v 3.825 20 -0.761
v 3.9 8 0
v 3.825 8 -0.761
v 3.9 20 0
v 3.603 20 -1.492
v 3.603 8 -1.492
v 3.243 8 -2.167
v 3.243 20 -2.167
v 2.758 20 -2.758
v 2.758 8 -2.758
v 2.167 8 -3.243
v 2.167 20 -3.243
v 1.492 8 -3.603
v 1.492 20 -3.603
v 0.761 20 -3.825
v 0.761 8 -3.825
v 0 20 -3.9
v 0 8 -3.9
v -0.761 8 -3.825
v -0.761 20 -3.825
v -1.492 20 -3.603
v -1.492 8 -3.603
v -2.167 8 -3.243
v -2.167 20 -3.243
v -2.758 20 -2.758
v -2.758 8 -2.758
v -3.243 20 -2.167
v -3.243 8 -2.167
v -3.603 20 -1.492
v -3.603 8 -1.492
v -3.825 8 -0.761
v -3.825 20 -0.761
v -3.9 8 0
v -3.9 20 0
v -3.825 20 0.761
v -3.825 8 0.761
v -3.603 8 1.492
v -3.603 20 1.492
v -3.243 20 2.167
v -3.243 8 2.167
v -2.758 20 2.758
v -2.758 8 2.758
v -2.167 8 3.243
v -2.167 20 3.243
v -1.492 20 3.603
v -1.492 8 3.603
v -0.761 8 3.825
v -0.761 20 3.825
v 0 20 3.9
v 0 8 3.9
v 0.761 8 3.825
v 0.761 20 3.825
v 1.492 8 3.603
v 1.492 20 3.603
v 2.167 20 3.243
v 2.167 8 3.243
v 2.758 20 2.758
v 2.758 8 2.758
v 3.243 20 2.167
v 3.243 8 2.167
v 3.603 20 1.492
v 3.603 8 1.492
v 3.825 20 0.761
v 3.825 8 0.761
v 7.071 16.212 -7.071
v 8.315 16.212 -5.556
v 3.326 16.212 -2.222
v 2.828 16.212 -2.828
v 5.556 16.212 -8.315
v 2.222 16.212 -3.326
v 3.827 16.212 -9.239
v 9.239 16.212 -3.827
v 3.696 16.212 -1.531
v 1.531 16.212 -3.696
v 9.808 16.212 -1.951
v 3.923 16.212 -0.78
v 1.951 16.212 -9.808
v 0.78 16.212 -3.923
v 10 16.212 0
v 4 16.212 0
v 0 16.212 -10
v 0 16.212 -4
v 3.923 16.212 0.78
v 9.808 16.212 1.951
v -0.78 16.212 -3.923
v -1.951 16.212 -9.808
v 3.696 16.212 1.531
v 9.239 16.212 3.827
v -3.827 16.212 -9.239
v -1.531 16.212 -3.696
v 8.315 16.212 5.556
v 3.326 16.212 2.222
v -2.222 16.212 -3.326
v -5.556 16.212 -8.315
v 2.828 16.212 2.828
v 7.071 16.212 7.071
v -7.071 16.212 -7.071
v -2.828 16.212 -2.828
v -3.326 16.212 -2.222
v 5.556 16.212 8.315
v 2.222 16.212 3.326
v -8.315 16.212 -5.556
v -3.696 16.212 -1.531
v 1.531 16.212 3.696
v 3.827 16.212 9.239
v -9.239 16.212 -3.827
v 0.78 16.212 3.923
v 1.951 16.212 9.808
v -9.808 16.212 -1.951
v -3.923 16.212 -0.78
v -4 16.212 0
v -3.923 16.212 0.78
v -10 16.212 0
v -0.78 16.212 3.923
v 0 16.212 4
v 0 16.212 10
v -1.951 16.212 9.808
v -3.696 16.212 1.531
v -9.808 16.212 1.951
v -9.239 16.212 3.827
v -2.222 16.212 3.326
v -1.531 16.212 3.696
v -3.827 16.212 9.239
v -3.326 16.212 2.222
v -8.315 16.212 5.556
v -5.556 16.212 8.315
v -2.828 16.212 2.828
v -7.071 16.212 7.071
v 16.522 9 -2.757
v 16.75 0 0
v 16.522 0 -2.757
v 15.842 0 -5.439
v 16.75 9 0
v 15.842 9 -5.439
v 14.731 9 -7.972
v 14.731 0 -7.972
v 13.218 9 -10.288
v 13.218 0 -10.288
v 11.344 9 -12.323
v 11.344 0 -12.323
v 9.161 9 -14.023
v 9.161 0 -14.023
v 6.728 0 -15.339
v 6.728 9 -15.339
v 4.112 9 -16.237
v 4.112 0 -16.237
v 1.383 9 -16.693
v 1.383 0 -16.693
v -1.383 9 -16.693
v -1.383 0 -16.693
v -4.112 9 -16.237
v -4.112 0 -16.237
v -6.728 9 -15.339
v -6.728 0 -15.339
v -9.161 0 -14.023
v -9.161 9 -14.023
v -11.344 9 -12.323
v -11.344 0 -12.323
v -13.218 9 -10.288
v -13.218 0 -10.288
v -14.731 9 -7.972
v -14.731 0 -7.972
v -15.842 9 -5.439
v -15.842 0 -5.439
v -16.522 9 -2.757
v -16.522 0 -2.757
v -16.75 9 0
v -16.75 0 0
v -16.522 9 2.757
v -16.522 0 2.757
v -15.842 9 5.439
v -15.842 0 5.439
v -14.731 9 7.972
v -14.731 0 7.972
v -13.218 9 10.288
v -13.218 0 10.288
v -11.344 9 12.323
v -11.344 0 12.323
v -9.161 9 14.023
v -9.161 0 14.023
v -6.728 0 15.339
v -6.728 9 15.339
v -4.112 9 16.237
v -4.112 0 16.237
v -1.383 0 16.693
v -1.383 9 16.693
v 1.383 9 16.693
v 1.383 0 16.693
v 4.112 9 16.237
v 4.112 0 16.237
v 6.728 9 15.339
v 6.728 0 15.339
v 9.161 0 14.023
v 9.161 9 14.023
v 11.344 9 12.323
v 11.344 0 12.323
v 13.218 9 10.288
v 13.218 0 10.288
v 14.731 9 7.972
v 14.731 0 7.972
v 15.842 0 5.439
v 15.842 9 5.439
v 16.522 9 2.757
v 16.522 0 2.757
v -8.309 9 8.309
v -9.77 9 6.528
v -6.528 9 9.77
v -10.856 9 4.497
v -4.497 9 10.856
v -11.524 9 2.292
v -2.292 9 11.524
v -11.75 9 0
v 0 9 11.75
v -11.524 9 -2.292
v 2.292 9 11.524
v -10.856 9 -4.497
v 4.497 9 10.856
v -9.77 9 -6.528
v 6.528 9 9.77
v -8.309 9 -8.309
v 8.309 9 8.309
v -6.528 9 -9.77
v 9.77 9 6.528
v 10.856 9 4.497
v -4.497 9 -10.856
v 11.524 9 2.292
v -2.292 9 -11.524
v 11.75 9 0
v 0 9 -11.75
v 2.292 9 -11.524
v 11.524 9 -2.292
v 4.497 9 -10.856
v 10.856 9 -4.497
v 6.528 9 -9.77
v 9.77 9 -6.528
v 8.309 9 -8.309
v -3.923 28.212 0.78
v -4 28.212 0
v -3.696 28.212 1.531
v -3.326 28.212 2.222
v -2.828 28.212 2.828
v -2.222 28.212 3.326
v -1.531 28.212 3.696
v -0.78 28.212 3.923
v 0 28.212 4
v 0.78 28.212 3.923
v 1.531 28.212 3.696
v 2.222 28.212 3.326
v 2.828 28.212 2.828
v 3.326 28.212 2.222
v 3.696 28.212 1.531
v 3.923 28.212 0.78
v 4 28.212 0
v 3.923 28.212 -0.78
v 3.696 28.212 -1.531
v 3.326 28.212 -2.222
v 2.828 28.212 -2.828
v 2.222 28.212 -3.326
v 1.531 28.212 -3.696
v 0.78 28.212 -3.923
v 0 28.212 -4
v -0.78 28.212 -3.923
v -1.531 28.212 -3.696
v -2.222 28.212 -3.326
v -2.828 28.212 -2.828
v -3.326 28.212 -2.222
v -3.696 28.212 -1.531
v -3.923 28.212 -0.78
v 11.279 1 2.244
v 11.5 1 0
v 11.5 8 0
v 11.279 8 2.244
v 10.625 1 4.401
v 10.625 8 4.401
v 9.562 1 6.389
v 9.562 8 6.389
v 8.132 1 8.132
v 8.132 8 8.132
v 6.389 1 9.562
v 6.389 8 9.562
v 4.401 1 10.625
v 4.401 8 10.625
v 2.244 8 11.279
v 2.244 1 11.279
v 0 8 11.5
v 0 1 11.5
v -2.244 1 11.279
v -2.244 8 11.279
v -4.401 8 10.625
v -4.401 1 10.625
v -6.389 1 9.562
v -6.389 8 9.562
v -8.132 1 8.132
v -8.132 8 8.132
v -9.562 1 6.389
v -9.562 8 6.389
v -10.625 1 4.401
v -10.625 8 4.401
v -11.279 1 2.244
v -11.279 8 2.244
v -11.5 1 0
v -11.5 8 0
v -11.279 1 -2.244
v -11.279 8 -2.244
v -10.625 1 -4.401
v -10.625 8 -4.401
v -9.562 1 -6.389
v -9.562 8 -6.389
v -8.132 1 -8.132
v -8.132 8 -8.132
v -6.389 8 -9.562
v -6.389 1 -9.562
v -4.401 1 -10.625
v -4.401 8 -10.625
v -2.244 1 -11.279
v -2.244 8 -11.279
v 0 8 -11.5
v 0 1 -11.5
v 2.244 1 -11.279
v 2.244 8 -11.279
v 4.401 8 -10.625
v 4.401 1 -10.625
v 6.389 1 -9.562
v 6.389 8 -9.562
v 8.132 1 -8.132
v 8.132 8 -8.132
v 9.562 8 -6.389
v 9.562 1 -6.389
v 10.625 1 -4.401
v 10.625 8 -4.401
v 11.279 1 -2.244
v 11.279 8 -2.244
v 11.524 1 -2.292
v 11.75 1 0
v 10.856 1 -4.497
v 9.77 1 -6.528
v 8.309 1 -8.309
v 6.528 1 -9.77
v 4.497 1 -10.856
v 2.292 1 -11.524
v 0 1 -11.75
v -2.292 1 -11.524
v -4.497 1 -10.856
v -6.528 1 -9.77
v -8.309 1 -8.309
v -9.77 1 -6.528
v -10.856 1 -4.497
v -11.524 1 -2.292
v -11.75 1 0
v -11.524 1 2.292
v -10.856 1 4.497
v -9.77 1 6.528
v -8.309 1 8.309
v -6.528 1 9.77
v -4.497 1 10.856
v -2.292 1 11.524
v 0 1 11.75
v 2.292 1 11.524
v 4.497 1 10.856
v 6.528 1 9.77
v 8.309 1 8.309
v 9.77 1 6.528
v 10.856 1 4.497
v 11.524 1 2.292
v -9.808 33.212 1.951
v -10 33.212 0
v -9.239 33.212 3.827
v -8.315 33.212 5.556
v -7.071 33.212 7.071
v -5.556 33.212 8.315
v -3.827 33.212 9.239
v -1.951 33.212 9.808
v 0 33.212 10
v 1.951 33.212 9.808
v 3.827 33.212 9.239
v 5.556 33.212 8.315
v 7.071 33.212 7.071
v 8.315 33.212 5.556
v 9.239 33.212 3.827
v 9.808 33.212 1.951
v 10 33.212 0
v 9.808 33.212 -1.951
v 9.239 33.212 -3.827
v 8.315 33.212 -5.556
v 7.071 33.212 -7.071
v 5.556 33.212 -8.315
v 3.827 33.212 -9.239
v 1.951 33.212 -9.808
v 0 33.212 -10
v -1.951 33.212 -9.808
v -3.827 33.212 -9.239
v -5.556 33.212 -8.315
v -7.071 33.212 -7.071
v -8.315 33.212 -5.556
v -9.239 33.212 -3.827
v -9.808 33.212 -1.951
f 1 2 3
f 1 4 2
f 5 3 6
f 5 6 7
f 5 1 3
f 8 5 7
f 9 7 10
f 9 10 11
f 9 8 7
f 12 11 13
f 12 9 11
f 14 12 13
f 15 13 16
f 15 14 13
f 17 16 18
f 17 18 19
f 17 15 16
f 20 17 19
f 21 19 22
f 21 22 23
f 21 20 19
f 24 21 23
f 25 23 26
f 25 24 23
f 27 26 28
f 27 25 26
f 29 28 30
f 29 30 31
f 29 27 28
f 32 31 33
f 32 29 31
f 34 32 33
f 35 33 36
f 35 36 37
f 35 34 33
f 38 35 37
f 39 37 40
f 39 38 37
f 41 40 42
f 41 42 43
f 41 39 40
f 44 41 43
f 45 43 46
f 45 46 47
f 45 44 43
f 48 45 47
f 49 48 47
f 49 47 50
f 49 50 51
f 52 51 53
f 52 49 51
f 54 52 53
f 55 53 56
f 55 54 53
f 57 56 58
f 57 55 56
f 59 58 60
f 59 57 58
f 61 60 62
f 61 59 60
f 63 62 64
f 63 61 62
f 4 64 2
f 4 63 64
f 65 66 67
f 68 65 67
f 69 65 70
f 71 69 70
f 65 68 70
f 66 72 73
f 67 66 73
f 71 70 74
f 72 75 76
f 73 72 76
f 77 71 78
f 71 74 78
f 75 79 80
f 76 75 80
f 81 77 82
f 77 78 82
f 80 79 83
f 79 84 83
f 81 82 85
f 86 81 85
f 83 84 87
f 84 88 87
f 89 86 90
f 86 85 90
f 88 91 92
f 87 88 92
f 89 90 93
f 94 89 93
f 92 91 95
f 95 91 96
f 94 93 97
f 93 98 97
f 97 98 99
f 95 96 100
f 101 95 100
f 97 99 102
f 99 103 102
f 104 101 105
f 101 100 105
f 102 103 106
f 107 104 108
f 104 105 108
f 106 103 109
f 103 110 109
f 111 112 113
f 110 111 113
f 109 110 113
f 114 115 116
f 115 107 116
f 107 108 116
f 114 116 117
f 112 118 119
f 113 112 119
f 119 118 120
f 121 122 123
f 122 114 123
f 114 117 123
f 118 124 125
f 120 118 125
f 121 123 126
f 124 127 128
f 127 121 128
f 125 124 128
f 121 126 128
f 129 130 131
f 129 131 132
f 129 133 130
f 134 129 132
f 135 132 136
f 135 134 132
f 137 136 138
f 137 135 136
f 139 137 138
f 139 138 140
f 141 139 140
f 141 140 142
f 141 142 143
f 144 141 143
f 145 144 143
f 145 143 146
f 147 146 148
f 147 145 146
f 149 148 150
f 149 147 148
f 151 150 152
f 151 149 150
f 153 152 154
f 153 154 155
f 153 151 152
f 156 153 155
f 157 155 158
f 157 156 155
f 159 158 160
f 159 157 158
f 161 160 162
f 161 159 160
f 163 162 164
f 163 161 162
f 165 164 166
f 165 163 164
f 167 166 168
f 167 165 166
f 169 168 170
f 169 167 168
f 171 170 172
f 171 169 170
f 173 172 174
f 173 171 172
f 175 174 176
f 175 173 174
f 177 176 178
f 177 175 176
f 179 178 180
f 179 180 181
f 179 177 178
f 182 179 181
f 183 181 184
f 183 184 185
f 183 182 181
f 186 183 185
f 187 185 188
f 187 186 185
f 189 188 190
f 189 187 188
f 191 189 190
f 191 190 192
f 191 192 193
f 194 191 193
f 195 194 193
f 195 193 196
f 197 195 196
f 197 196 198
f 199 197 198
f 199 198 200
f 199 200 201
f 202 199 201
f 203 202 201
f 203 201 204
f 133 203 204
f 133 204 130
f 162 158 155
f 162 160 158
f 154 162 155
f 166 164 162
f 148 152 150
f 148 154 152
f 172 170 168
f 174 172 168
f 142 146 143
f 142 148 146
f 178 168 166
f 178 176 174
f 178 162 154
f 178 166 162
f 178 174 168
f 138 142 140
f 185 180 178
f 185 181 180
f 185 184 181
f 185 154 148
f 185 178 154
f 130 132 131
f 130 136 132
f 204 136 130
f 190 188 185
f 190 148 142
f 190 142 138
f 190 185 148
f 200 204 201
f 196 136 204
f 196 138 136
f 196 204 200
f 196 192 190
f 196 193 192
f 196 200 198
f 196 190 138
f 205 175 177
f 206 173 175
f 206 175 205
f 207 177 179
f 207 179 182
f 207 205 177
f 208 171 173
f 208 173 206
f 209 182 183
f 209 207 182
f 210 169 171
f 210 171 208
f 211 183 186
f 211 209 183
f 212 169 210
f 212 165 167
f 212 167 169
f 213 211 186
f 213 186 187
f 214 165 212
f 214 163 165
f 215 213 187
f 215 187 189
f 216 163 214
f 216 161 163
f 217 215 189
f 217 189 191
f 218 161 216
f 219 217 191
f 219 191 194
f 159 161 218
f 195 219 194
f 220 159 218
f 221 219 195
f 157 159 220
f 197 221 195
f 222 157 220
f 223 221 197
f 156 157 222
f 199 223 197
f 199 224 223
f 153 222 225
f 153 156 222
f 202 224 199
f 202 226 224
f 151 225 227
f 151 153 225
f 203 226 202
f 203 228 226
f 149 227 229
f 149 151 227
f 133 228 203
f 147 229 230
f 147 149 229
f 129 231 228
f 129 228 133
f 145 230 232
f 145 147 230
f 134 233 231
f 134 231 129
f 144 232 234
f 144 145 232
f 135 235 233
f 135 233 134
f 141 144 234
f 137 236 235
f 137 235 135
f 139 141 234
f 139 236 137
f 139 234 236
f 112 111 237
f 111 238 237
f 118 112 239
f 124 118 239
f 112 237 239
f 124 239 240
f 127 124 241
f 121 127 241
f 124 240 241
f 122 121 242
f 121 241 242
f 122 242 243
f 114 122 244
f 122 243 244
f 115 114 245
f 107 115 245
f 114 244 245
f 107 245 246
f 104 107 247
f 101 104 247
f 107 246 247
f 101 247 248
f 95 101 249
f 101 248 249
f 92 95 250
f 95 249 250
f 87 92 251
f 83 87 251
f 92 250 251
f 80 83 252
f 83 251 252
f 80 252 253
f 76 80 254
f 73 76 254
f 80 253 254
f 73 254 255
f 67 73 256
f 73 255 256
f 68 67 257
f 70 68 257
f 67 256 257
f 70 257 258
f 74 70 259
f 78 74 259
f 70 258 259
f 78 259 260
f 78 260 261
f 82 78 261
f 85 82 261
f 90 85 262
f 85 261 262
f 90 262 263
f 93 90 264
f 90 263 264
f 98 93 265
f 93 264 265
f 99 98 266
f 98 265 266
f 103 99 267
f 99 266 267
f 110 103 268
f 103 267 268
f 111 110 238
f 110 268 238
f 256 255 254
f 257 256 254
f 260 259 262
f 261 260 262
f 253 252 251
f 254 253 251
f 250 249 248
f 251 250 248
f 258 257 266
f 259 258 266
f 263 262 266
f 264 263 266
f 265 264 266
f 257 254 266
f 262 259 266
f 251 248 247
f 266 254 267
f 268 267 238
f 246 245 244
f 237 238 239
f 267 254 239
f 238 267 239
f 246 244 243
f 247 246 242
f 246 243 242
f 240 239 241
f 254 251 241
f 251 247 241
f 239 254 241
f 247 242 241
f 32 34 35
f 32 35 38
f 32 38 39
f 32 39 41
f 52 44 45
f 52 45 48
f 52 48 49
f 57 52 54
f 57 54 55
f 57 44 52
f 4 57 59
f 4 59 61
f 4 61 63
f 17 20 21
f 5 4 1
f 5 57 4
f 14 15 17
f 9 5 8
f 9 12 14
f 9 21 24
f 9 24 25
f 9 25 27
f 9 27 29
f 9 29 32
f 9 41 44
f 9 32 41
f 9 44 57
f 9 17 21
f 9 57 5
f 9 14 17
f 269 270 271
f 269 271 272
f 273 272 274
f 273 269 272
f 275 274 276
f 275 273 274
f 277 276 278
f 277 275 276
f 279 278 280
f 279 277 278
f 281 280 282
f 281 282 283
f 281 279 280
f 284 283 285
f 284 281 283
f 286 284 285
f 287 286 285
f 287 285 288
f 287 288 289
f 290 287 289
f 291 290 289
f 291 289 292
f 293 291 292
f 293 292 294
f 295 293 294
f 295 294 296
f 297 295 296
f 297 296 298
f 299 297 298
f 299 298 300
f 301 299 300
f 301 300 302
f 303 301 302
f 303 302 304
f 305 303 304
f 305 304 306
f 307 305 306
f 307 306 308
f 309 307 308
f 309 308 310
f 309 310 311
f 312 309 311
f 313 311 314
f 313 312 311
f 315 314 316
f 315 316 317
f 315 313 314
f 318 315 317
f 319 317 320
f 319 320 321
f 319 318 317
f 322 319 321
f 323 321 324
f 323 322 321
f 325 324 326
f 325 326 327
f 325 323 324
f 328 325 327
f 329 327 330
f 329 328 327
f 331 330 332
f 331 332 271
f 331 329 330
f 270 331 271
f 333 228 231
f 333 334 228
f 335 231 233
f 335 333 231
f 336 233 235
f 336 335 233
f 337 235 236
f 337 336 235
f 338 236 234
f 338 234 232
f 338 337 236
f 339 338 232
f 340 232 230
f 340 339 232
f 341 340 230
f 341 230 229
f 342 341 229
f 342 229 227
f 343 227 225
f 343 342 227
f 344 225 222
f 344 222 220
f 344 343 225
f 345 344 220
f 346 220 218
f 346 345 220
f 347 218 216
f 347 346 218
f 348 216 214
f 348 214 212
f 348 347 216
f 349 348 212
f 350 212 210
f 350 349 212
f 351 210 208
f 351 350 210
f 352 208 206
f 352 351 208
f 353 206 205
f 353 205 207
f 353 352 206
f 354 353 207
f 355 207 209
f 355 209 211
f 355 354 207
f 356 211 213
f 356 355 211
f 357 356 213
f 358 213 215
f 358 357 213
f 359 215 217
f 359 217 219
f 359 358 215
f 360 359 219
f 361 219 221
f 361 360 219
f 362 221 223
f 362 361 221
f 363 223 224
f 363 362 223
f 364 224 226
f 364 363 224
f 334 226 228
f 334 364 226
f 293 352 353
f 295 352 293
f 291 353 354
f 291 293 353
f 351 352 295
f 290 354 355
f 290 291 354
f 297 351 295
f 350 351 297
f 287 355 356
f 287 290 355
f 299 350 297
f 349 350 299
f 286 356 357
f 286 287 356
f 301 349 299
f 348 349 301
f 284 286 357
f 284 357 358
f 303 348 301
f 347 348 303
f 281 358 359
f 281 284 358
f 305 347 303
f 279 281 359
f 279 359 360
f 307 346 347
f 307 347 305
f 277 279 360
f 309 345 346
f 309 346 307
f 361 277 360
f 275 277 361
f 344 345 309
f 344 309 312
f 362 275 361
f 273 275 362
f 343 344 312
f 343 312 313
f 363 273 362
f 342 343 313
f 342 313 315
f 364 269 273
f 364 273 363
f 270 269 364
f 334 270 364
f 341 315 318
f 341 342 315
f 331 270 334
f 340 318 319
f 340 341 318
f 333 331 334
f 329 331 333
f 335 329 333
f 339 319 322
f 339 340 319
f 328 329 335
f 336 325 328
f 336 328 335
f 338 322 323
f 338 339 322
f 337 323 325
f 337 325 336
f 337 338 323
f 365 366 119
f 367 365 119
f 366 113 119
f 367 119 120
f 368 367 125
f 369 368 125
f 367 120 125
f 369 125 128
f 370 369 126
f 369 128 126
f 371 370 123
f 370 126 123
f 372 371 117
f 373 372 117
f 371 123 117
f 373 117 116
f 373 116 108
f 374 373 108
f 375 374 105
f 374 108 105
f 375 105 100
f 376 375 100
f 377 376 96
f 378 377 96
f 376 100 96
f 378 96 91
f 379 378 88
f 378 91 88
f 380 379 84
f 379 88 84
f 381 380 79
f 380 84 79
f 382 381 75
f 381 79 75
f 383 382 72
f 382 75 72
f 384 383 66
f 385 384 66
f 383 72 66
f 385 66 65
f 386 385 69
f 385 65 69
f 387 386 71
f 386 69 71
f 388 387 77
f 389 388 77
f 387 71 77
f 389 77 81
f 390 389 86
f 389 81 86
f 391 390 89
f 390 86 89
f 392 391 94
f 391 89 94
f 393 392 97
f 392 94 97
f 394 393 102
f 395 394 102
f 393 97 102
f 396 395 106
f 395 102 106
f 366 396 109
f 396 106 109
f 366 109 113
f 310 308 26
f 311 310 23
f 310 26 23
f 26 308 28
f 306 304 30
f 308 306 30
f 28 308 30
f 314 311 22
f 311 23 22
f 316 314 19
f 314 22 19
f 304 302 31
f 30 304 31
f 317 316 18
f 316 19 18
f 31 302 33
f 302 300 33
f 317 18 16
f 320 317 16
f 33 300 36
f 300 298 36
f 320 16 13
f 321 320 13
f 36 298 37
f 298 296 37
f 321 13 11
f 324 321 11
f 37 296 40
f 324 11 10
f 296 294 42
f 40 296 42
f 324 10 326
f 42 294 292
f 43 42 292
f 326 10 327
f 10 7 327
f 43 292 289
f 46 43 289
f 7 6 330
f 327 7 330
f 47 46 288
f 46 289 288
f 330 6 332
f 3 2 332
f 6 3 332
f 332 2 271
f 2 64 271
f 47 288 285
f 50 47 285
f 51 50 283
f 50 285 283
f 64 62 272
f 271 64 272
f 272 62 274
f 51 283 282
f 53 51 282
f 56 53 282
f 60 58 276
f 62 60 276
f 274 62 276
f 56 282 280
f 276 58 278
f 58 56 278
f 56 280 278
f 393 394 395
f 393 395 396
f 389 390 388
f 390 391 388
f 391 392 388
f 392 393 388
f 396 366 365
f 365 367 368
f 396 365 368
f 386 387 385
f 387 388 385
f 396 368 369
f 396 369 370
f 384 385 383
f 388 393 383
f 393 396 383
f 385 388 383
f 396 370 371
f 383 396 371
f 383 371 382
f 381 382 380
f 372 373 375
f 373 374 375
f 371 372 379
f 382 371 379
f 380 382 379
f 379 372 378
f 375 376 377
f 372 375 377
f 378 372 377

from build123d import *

# Parameters (mm, degrees)
F4_R     = 11.5
F5_DEPTH = 8


# Not quite as in the source:
# - a feature names something its author has since deleted; it is built from what else it names


with BuildPart() as f1:
    # F0 (on Top) → F1 (revolve)
    with BuildSketch(Plane.XY):
        Polygon((0, 20), (0, 0), (16.75, 0), (16.75, 9), (11.75, 9), (11.75, 1), (3.9, 1), (3.9, 20), align=None)
    revolve(axis=Axis((0, 10, 0), (0, 1, 0)))

    # F4 (on Front) → F5 (join)
    with BuildSketch(Plane.XZ):
        Circle(F4_R)
    extrude(amount=-F5_DEPTH)


with BuildPart() as f3:
    # F2 (on Top) → F3 (revolve)
    with BuildSketch(Plane.XY):
        Polygon((-10, 16.2120937904), (-4, 16.2120937904), (-4, 28.2120937904), (0, 28.2120937904), (0, 33.2120937904), (-10, 33.2120937904), align=None)
    revolve(axis=Axis((0, 30.7120937904, 0), (0, 1, 0)))


solid = Compound([f1.part, f3.part])
